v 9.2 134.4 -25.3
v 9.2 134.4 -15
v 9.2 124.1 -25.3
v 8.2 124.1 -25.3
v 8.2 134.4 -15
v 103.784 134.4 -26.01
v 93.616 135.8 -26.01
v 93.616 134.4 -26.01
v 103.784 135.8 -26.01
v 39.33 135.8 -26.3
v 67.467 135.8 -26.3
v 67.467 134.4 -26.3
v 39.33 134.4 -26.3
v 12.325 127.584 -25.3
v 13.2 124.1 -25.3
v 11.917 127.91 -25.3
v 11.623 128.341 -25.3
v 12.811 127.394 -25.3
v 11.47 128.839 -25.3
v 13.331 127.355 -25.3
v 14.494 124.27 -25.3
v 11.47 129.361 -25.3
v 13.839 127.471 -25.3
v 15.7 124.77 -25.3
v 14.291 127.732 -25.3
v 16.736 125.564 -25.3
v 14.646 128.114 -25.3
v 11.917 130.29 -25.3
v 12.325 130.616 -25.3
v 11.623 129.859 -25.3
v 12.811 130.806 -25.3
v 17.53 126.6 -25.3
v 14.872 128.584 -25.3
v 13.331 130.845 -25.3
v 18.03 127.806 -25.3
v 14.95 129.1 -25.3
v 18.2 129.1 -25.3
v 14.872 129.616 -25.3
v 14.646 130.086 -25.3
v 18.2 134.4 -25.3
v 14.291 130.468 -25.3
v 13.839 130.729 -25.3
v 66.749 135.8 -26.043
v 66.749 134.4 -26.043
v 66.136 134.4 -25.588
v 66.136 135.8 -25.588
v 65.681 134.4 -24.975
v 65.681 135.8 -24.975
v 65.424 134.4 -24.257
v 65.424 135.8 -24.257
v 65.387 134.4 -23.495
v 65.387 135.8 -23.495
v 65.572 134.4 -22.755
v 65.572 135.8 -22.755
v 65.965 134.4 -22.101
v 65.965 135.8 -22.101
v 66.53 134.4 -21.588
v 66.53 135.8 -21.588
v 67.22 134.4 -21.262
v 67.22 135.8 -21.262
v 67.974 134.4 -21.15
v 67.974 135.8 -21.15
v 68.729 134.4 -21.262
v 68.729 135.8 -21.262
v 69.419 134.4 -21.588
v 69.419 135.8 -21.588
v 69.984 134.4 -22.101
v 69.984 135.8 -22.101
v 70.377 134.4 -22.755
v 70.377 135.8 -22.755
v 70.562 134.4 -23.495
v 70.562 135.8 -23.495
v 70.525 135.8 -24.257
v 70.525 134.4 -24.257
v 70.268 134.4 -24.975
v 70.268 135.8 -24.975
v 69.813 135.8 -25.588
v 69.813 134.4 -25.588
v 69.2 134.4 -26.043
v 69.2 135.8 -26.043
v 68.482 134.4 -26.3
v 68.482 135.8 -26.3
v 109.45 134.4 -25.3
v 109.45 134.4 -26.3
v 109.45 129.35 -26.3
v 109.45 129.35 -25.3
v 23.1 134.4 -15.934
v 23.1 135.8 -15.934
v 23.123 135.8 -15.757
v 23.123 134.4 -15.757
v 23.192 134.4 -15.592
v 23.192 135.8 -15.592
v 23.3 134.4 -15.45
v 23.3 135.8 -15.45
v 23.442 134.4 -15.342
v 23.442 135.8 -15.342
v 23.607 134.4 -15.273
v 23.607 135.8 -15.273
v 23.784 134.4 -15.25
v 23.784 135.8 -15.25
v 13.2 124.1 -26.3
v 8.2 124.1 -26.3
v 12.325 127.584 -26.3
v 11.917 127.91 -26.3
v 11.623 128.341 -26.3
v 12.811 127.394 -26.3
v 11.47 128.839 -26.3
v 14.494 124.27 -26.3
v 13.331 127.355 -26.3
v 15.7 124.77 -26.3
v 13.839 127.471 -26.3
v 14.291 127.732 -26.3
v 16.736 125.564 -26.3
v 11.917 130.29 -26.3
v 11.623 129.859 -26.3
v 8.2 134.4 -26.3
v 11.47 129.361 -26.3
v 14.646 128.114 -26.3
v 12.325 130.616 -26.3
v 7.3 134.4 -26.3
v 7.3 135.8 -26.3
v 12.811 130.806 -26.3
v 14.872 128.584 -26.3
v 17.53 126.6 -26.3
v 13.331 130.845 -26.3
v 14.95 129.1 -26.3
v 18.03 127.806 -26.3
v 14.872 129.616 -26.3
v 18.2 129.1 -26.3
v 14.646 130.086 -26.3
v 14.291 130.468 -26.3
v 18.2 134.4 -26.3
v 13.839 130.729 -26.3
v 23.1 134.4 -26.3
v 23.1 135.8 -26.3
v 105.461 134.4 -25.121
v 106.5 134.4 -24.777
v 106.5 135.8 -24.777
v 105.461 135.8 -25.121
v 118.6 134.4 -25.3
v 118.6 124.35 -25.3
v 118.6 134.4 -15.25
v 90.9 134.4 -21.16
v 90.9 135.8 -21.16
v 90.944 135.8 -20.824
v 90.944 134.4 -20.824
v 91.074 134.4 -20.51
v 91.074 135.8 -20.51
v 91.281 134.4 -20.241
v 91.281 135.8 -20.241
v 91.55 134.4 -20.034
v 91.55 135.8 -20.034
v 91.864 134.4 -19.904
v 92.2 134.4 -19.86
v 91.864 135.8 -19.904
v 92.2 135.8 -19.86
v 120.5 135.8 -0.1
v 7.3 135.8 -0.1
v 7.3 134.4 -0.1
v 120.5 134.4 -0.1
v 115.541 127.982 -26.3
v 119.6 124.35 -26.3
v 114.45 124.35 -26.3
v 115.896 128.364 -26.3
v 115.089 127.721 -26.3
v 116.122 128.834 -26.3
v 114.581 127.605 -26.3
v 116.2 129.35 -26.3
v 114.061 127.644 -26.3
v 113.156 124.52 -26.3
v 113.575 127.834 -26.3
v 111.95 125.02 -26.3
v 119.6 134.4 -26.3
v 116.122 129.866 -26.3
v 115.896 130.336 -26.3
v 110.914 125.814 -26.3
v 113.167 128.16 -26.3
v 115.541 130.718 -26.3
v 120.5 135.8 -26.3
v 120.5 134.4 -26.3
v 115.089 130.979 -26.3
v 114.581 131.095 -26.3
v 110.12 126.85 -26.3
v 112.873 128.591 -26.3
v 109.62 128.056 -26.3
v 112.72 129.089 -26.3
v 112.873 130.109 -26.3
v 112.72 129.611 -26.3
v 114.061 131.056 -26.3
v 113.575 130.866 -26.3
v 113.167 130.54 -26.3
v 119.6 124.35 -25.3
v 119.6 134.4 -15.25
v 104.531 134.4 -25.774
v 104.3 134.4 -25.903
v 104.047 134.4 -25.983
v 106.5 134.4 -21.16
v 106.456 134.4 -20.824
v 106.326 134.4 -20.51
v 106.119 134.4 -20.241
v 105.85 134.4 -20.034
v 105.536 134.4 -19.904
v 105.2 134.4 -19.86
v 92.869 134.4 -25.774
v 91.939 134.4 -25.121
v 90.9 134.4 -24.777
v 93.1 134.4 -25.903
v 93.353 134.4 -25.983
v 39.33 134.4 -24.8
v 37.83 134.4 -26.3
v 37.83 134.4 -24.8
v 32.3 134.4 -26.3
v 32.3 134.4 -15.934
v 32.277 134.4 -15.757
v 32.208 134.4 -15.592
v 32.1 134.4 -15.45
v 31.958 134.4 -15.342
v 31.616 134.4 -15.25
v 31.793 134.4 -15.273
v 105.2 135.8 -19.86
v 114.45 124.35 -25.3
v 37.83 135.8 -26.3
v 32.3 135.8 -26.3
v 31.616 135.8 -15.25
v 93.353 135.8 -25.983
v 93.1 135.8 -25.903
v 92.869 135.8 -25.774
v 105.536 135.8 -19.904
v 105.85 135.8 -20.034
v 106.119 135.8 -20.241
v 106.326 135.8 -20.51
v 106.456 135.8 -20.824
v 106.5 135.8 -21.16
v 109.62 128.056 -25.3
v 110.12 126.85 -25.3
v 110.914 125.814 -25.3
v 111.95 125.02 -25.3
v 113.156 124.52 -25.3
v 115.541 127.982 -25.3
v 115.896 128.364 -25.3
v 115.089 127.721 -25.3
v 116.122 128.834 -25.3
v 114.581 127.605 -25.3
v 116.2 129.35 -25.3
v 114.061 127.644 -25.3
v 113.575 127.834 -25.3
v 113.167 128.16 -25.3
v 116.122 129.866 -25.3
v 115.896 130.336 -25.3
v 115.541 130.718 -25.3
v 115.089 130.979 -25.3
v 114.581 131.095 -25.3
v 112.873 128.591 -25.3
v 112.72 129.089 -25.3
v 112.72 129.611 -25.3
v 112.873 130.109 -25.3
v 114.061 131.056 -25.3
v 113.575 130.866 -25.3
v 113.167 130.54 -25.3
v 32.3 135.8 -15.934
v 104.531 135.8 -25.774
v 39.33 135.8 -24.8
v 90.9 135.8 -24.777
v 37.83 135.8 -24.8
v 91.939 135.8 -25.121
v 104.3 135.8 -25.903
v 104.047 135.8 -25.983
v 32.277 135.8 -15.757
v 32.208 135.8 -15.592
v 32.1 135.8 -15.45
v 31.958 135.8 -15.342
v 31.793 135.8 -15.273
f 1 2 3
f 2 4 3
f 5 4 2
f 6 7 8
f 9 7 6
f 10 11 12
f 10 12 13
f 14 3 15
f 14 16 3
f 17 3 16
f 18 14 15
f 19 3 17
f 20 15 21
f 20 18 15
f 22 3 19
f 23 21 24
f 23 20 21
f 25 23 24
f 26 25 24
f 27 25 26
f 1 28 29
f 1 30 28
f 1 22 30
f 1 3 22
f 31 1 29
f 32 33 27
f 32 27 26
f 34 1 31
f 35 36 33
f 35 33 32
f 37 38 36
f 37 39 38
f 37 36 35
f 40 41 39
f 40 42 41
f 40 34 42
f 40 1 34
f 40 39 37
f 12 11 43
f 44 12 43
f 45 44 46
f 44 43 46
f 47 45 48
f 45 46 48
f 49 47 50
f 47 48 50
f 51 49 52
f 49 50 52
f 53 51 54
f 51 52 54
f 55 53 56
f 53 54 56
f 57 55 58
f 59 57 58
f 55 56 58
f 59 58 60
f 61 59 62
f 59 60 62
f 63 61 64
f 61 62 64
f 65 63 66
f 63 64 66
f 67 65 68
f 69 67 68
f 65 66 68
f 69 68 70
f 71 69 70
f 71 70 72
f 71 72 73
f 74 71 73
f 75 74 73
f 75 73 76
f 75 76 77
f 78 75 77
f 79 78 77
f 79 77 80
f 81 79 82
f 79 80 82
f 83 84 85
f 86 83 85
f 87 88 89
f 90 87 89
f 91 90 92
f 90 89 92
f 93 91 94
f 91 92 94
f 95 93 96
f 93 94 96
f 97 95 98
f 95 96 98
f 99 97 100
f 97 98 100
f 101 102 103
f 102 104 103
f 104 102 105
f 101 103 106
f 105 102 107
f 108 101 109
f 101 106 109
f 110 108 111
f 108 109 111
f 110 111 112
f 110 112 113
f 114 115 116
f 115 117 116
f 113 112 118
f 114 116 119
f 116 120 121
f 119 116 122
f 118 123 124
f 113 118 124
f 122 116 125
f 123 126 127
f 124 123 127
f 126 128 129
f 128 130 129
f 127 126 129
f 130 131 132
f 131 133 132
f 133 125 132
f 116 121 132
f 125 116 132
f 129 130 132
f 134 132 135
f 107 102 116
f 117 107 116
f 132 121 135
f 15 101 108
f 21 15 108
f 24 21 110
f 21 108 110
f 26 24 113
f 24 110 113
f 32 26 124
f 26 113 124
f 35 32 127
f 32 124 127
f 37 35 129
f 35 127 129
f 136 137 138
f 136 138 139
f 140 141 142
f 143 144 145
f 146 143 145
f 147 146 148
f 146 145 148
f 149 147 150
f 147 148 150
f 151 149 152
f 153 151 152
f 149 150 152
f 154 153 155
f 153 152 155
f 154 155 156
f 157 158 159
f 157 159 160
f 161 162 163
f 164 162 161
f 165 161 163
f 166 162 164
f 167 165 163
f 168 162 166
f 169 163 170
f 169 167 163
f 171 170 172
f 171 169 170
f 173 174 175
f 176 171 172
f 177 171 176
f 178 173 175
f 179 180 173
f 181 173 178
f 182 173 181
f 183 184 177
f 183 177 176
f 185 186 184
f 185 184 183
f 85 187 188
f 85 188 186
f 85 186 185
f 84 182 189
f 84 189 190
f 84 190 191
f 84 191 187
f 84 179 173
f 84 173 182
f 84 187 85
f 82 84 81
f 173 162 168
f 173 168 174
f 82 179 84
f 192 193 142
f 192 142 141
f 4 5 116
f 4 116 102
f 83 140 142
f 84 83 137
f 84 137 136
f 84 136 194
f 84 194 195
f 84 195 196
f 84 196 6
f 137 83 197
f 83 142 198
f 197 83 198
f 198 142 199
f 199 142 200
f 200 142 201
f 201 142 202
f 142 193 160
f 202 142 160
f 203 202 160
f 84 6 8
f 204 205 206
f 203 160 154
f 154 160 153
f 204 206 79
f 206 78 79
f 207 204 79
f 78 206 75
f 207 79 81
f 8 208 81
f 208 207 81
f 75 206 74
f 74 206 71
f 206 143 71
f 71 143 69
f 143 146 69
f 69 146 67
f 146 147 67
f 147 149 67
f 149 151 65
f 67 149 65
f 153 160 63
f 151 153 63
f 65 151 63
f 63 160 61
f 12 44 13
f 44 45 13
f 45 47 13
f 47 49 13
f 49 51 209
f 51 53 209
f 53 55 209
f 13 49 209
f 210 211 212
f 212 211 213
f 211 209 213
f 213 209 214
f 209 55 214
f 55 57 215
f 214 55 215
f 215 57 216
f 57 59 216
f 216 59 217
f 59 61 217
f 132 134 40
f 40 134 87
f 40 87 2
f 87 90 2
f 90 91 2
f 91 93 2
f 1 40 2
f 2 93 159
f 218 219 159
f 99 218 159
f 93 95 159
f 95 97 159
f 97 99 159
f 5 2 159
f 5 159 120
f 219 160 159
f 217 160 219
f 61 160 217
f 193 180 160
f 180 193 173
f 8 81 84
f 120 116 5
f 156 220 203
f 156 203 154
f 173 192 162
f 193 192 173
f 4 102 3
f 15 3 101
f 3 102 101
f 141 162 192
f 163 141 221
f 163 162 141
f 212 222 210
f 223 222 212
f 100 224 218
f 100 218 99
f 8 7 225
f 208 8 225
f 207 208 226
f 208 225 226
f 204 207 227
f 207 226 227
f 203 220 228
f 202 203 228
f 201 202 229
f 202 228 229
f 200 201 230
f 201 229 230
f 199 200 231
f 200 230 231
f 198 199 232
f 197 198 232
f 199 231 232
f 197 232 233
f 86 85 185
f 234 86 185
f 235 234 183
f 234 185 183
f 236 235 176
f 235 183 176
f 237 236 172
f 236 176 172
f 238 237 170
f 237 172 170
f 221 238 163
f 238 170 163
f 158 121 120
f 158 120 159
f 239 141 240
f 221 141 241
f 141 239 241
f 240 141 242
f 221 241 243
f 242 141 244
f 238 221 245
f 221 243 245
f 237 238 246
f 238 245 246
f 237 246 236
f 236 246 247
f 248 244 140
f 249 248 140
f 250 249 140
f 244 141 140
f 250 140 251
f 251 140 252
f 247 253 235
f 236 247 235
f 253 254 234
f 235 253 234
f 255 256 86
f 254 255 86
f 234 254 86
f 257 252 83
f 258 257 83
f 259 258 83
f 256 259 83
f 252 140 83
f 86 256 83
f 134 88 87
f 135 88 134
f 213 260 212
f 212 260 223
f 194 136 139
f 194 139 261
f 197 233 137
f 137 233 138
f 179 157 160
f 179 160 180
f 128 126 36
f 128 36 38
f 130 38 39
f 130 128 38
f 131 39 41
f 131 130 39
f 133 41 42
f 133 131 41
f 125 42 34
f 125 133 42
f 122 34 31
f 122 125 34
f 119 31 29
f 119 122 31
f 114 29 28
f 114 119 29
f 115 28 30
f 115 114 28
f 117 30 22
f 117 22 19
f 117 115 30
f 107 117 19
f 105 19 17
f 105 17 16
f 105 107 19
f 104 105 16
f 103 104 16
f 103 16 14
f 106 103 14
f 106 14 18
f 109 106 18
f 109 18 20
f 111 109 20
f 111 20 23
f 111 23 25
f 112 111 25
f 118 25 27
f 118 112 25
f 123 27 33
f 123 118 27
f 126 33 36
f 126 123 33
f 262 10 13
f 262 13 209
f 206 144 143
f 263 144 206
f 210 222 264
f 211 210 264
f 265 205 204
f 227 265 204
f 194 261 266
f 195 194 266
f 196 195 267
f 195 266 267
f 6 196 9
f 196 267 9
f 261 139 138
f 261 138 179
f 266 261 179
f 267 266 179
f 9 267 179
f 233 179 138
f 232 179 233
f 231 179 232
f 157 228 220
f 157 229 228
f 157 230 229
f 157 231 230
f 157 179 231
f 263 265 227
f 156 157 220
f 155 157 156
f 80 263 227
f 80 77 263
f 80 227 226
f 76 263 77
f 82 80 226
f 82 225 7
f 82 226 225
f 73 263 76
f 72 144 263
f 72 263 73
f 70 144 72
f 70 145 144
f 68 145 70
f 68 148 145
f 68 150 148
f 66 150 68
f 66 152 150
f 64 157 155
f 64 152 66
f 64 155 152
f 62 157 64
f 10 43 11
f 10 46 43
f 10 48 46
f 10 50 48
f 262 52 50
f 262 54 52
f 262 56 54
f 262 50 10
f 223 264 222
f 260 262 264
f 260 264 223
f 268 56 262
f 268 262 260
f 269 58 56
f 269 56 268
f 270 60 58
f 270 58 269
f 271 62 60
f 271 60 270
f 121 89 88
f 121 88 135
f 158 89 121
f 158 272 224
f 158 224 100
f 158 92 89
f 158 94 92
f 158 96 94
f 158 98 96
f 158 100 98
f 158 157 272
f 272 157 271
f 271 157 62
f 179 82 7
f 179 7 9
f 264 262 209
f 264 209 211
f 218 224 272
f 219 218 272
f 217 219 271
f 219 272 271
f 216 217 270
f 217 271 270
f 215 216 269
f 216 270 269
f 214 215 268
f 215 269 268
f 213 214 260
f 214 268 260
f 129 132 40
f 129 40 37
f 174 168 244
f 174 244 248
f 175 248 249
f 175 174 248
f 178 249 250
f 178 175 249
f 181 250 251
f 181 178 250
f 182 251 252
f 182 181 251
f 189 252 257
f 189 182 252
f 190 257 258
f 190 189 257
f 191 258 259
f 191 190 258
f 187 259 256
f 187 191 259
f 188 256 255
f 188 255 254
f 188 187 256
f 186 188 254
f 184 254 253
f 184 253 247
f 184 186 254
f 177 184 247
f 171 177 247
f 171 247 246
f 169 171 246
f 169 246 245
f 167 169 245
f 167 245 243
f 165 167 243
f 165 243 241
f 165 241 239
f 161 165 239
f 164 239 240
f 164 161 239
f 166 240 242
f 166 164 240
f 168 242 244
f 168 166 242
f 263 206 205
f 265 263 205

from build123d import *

# Parameters (mm, degrees)
PAD028_DEPTH    = 1.4
SKETCH048_R     = 1.75
PAD029_DEPTH    = 1
PAD030_DEPTH    = 1
PAD031_DEPTH    = 1
SKETCH179_W     = 1.5
SKETCH179_H     = 1.5
POCKET061_DEPTH = 5


with BuildPart() as part:
    # Sketch047 (on Face725 of Binder021) → Pad028 (new body)
    with BuildSketch(Plane(origin=(0, 135.8, 0), x_dir=(-1, 0, 0), z_dir=(0, 1, 0))):
        with BuildLine():
            Line((-120.499982, -0.1), (-120.499982, -26.3))
            Line((-120.499982, -26.3), (-68.48194, -26.3))
            ThreePointArc((-67.46705, -26.3), (-67.974495, -21.15), (-68.48194, -26.3))
            Line((-67.46705, -26.3), (-32.299995, -26.3))
            Line((-32.299995, -15.934266), (-32.299995, -26.3))
            ThreePointArc((-31.615729, -15.25), (-32.099578, -15.450417), (-32.299995, -15.934266))
            Line((-31.615729, -15.25), (-23.784261, -15.25))
            ThreePointArc((-23.099995, -15.934266), (-23.300412, -15.450417), (-23.784261, -15.25))
            Line((-23.099995, -15.934266), (-23.099995, -26.3))
            Line((-7.299995, -26.3), (-23.099995, -26.3))
            Line((-7.299995, -26.3), (-7.299995, -0.1))
            Line((-7.299995, -0.1), (-120.499982, -0.1))
        make_face()
        with BuildLine():
            Line((-105.199995, -19.86), (-92.199994, -19.86))
            ThreePointArc((-90.899995, -21.16), (-91.280756, -20.240762), (-92.199994, -19.86))
            Line((-90.899995, -21.16), (-90.899995, -24.776619))
            Line((-90.899995, -24.776619), (-91.938732, -25.120886))
            Line((-91.938732, -25.120886), (-92.869018, -25.773985))
            ThreePointArc((-93.61597, -26.01), (-93.224294, -25.949593), (-92.869018, -25.773985))
            Line((-93.61597, -26.01), (-103.78402, -26.01))
            ThreePointArc((-104.530977, -25.773981), (-104.175699, -25.949592), (-103.78402, -26.01))
            Line((-105.461258, -25.120886), (-104.530977, -25.773981))
            Line((-106.499995, -24.776619), (-105.461258, -25.120886))
            Line((-106.499995, -21.16), (-106.499995, -24.776619))
            ThreePointArc((-105.199995, -19.86), (-106.119234, -20.240761), (-106.499995, -21.16))
        make_face(mode=Mode.SUBTRACT)
    extrude(amount=-PAD028_DEPTH)

    # Sketch048 (on Face5 of Binder022) → Pad029 (join)
    with BuildSketch(Plane.XY.offset(-26.3)):
        with BuildLine():
            Line((18.199995, 134.4), (8.199995, 134.4))
            Line((8.199995, 134.4), (8.199995, 124.1))
            Line((8.199995, 124.1), (13.199995, 124.1))
            ThreePointArc((13.199995, 124.1), (16.735529, 125.564466), (18.199995, 129.1))
            Line((18.199995, 134.4), (18.199995, 129.1))
        make_face()
        with Locations((13.199995, 129.1)):
            Circle(SKETCH048_R, mode=Mode.SUBTRACT)
        with BuildLine():
            Line((109.449995, 134.4), (119.599982, 134.4))
            Line((119.599982, 134.4), (119.599982, 124.35))
            Line((119.599982, 124.35), (114.449995, 124.35))
            ThreePointArc((109.449995, 129.35), (110.914461, 125.814466), (114.449995, 124.35))
            Line((109.449995, 134.4), (109.449995, 129.35))
        make_face()
        with Locations((114.449995, 129.35)):
            Circle(SKETCH048_R, mode=Mode.SUBTRACT)
    extrude(amount=PAD029_DEPTH)

    # Sketch049 (on Face25 of Pad029) → Pad030 (join)
    with BuildSketch(Plane(origin=(8.199995, 0, 0), x_dir=(0, -1, 0), z_dir=(-1, 0, 0))):
        Polygon((-134.4, -25.3), (-124.1, -25.3), (-134.4, -15), align=None)
    extrude(amount=-PAD030_DEPTH)

    # Sketch050 (on Face36 of Pad030) → Pad031 (join)
    with BuildSketch(Plane.YZ.offset(119.599982)):
        Polygon((124.35, -25.3), (134.4, -25.3), (134.4, -15.25), align=None)
    extrude(amount=-PAD031_DEPTH)

    # Sketch179 (on Face4 of Clone005) → Pocket061 (cut)
    with BuildSketch(Plane(origin=(0, 135.8, 0), x_dir=(-1, 0, 0), z_dir=(0, 1, 0))):
        with Locations((-38.579995, -25.55)):
            Rectangle(SKETCH179_W, SKETCH179_H)
    extrude(amount=-POCKET061_DEPTH, mode=Mode.SUBTRACT)


solid = part.part
